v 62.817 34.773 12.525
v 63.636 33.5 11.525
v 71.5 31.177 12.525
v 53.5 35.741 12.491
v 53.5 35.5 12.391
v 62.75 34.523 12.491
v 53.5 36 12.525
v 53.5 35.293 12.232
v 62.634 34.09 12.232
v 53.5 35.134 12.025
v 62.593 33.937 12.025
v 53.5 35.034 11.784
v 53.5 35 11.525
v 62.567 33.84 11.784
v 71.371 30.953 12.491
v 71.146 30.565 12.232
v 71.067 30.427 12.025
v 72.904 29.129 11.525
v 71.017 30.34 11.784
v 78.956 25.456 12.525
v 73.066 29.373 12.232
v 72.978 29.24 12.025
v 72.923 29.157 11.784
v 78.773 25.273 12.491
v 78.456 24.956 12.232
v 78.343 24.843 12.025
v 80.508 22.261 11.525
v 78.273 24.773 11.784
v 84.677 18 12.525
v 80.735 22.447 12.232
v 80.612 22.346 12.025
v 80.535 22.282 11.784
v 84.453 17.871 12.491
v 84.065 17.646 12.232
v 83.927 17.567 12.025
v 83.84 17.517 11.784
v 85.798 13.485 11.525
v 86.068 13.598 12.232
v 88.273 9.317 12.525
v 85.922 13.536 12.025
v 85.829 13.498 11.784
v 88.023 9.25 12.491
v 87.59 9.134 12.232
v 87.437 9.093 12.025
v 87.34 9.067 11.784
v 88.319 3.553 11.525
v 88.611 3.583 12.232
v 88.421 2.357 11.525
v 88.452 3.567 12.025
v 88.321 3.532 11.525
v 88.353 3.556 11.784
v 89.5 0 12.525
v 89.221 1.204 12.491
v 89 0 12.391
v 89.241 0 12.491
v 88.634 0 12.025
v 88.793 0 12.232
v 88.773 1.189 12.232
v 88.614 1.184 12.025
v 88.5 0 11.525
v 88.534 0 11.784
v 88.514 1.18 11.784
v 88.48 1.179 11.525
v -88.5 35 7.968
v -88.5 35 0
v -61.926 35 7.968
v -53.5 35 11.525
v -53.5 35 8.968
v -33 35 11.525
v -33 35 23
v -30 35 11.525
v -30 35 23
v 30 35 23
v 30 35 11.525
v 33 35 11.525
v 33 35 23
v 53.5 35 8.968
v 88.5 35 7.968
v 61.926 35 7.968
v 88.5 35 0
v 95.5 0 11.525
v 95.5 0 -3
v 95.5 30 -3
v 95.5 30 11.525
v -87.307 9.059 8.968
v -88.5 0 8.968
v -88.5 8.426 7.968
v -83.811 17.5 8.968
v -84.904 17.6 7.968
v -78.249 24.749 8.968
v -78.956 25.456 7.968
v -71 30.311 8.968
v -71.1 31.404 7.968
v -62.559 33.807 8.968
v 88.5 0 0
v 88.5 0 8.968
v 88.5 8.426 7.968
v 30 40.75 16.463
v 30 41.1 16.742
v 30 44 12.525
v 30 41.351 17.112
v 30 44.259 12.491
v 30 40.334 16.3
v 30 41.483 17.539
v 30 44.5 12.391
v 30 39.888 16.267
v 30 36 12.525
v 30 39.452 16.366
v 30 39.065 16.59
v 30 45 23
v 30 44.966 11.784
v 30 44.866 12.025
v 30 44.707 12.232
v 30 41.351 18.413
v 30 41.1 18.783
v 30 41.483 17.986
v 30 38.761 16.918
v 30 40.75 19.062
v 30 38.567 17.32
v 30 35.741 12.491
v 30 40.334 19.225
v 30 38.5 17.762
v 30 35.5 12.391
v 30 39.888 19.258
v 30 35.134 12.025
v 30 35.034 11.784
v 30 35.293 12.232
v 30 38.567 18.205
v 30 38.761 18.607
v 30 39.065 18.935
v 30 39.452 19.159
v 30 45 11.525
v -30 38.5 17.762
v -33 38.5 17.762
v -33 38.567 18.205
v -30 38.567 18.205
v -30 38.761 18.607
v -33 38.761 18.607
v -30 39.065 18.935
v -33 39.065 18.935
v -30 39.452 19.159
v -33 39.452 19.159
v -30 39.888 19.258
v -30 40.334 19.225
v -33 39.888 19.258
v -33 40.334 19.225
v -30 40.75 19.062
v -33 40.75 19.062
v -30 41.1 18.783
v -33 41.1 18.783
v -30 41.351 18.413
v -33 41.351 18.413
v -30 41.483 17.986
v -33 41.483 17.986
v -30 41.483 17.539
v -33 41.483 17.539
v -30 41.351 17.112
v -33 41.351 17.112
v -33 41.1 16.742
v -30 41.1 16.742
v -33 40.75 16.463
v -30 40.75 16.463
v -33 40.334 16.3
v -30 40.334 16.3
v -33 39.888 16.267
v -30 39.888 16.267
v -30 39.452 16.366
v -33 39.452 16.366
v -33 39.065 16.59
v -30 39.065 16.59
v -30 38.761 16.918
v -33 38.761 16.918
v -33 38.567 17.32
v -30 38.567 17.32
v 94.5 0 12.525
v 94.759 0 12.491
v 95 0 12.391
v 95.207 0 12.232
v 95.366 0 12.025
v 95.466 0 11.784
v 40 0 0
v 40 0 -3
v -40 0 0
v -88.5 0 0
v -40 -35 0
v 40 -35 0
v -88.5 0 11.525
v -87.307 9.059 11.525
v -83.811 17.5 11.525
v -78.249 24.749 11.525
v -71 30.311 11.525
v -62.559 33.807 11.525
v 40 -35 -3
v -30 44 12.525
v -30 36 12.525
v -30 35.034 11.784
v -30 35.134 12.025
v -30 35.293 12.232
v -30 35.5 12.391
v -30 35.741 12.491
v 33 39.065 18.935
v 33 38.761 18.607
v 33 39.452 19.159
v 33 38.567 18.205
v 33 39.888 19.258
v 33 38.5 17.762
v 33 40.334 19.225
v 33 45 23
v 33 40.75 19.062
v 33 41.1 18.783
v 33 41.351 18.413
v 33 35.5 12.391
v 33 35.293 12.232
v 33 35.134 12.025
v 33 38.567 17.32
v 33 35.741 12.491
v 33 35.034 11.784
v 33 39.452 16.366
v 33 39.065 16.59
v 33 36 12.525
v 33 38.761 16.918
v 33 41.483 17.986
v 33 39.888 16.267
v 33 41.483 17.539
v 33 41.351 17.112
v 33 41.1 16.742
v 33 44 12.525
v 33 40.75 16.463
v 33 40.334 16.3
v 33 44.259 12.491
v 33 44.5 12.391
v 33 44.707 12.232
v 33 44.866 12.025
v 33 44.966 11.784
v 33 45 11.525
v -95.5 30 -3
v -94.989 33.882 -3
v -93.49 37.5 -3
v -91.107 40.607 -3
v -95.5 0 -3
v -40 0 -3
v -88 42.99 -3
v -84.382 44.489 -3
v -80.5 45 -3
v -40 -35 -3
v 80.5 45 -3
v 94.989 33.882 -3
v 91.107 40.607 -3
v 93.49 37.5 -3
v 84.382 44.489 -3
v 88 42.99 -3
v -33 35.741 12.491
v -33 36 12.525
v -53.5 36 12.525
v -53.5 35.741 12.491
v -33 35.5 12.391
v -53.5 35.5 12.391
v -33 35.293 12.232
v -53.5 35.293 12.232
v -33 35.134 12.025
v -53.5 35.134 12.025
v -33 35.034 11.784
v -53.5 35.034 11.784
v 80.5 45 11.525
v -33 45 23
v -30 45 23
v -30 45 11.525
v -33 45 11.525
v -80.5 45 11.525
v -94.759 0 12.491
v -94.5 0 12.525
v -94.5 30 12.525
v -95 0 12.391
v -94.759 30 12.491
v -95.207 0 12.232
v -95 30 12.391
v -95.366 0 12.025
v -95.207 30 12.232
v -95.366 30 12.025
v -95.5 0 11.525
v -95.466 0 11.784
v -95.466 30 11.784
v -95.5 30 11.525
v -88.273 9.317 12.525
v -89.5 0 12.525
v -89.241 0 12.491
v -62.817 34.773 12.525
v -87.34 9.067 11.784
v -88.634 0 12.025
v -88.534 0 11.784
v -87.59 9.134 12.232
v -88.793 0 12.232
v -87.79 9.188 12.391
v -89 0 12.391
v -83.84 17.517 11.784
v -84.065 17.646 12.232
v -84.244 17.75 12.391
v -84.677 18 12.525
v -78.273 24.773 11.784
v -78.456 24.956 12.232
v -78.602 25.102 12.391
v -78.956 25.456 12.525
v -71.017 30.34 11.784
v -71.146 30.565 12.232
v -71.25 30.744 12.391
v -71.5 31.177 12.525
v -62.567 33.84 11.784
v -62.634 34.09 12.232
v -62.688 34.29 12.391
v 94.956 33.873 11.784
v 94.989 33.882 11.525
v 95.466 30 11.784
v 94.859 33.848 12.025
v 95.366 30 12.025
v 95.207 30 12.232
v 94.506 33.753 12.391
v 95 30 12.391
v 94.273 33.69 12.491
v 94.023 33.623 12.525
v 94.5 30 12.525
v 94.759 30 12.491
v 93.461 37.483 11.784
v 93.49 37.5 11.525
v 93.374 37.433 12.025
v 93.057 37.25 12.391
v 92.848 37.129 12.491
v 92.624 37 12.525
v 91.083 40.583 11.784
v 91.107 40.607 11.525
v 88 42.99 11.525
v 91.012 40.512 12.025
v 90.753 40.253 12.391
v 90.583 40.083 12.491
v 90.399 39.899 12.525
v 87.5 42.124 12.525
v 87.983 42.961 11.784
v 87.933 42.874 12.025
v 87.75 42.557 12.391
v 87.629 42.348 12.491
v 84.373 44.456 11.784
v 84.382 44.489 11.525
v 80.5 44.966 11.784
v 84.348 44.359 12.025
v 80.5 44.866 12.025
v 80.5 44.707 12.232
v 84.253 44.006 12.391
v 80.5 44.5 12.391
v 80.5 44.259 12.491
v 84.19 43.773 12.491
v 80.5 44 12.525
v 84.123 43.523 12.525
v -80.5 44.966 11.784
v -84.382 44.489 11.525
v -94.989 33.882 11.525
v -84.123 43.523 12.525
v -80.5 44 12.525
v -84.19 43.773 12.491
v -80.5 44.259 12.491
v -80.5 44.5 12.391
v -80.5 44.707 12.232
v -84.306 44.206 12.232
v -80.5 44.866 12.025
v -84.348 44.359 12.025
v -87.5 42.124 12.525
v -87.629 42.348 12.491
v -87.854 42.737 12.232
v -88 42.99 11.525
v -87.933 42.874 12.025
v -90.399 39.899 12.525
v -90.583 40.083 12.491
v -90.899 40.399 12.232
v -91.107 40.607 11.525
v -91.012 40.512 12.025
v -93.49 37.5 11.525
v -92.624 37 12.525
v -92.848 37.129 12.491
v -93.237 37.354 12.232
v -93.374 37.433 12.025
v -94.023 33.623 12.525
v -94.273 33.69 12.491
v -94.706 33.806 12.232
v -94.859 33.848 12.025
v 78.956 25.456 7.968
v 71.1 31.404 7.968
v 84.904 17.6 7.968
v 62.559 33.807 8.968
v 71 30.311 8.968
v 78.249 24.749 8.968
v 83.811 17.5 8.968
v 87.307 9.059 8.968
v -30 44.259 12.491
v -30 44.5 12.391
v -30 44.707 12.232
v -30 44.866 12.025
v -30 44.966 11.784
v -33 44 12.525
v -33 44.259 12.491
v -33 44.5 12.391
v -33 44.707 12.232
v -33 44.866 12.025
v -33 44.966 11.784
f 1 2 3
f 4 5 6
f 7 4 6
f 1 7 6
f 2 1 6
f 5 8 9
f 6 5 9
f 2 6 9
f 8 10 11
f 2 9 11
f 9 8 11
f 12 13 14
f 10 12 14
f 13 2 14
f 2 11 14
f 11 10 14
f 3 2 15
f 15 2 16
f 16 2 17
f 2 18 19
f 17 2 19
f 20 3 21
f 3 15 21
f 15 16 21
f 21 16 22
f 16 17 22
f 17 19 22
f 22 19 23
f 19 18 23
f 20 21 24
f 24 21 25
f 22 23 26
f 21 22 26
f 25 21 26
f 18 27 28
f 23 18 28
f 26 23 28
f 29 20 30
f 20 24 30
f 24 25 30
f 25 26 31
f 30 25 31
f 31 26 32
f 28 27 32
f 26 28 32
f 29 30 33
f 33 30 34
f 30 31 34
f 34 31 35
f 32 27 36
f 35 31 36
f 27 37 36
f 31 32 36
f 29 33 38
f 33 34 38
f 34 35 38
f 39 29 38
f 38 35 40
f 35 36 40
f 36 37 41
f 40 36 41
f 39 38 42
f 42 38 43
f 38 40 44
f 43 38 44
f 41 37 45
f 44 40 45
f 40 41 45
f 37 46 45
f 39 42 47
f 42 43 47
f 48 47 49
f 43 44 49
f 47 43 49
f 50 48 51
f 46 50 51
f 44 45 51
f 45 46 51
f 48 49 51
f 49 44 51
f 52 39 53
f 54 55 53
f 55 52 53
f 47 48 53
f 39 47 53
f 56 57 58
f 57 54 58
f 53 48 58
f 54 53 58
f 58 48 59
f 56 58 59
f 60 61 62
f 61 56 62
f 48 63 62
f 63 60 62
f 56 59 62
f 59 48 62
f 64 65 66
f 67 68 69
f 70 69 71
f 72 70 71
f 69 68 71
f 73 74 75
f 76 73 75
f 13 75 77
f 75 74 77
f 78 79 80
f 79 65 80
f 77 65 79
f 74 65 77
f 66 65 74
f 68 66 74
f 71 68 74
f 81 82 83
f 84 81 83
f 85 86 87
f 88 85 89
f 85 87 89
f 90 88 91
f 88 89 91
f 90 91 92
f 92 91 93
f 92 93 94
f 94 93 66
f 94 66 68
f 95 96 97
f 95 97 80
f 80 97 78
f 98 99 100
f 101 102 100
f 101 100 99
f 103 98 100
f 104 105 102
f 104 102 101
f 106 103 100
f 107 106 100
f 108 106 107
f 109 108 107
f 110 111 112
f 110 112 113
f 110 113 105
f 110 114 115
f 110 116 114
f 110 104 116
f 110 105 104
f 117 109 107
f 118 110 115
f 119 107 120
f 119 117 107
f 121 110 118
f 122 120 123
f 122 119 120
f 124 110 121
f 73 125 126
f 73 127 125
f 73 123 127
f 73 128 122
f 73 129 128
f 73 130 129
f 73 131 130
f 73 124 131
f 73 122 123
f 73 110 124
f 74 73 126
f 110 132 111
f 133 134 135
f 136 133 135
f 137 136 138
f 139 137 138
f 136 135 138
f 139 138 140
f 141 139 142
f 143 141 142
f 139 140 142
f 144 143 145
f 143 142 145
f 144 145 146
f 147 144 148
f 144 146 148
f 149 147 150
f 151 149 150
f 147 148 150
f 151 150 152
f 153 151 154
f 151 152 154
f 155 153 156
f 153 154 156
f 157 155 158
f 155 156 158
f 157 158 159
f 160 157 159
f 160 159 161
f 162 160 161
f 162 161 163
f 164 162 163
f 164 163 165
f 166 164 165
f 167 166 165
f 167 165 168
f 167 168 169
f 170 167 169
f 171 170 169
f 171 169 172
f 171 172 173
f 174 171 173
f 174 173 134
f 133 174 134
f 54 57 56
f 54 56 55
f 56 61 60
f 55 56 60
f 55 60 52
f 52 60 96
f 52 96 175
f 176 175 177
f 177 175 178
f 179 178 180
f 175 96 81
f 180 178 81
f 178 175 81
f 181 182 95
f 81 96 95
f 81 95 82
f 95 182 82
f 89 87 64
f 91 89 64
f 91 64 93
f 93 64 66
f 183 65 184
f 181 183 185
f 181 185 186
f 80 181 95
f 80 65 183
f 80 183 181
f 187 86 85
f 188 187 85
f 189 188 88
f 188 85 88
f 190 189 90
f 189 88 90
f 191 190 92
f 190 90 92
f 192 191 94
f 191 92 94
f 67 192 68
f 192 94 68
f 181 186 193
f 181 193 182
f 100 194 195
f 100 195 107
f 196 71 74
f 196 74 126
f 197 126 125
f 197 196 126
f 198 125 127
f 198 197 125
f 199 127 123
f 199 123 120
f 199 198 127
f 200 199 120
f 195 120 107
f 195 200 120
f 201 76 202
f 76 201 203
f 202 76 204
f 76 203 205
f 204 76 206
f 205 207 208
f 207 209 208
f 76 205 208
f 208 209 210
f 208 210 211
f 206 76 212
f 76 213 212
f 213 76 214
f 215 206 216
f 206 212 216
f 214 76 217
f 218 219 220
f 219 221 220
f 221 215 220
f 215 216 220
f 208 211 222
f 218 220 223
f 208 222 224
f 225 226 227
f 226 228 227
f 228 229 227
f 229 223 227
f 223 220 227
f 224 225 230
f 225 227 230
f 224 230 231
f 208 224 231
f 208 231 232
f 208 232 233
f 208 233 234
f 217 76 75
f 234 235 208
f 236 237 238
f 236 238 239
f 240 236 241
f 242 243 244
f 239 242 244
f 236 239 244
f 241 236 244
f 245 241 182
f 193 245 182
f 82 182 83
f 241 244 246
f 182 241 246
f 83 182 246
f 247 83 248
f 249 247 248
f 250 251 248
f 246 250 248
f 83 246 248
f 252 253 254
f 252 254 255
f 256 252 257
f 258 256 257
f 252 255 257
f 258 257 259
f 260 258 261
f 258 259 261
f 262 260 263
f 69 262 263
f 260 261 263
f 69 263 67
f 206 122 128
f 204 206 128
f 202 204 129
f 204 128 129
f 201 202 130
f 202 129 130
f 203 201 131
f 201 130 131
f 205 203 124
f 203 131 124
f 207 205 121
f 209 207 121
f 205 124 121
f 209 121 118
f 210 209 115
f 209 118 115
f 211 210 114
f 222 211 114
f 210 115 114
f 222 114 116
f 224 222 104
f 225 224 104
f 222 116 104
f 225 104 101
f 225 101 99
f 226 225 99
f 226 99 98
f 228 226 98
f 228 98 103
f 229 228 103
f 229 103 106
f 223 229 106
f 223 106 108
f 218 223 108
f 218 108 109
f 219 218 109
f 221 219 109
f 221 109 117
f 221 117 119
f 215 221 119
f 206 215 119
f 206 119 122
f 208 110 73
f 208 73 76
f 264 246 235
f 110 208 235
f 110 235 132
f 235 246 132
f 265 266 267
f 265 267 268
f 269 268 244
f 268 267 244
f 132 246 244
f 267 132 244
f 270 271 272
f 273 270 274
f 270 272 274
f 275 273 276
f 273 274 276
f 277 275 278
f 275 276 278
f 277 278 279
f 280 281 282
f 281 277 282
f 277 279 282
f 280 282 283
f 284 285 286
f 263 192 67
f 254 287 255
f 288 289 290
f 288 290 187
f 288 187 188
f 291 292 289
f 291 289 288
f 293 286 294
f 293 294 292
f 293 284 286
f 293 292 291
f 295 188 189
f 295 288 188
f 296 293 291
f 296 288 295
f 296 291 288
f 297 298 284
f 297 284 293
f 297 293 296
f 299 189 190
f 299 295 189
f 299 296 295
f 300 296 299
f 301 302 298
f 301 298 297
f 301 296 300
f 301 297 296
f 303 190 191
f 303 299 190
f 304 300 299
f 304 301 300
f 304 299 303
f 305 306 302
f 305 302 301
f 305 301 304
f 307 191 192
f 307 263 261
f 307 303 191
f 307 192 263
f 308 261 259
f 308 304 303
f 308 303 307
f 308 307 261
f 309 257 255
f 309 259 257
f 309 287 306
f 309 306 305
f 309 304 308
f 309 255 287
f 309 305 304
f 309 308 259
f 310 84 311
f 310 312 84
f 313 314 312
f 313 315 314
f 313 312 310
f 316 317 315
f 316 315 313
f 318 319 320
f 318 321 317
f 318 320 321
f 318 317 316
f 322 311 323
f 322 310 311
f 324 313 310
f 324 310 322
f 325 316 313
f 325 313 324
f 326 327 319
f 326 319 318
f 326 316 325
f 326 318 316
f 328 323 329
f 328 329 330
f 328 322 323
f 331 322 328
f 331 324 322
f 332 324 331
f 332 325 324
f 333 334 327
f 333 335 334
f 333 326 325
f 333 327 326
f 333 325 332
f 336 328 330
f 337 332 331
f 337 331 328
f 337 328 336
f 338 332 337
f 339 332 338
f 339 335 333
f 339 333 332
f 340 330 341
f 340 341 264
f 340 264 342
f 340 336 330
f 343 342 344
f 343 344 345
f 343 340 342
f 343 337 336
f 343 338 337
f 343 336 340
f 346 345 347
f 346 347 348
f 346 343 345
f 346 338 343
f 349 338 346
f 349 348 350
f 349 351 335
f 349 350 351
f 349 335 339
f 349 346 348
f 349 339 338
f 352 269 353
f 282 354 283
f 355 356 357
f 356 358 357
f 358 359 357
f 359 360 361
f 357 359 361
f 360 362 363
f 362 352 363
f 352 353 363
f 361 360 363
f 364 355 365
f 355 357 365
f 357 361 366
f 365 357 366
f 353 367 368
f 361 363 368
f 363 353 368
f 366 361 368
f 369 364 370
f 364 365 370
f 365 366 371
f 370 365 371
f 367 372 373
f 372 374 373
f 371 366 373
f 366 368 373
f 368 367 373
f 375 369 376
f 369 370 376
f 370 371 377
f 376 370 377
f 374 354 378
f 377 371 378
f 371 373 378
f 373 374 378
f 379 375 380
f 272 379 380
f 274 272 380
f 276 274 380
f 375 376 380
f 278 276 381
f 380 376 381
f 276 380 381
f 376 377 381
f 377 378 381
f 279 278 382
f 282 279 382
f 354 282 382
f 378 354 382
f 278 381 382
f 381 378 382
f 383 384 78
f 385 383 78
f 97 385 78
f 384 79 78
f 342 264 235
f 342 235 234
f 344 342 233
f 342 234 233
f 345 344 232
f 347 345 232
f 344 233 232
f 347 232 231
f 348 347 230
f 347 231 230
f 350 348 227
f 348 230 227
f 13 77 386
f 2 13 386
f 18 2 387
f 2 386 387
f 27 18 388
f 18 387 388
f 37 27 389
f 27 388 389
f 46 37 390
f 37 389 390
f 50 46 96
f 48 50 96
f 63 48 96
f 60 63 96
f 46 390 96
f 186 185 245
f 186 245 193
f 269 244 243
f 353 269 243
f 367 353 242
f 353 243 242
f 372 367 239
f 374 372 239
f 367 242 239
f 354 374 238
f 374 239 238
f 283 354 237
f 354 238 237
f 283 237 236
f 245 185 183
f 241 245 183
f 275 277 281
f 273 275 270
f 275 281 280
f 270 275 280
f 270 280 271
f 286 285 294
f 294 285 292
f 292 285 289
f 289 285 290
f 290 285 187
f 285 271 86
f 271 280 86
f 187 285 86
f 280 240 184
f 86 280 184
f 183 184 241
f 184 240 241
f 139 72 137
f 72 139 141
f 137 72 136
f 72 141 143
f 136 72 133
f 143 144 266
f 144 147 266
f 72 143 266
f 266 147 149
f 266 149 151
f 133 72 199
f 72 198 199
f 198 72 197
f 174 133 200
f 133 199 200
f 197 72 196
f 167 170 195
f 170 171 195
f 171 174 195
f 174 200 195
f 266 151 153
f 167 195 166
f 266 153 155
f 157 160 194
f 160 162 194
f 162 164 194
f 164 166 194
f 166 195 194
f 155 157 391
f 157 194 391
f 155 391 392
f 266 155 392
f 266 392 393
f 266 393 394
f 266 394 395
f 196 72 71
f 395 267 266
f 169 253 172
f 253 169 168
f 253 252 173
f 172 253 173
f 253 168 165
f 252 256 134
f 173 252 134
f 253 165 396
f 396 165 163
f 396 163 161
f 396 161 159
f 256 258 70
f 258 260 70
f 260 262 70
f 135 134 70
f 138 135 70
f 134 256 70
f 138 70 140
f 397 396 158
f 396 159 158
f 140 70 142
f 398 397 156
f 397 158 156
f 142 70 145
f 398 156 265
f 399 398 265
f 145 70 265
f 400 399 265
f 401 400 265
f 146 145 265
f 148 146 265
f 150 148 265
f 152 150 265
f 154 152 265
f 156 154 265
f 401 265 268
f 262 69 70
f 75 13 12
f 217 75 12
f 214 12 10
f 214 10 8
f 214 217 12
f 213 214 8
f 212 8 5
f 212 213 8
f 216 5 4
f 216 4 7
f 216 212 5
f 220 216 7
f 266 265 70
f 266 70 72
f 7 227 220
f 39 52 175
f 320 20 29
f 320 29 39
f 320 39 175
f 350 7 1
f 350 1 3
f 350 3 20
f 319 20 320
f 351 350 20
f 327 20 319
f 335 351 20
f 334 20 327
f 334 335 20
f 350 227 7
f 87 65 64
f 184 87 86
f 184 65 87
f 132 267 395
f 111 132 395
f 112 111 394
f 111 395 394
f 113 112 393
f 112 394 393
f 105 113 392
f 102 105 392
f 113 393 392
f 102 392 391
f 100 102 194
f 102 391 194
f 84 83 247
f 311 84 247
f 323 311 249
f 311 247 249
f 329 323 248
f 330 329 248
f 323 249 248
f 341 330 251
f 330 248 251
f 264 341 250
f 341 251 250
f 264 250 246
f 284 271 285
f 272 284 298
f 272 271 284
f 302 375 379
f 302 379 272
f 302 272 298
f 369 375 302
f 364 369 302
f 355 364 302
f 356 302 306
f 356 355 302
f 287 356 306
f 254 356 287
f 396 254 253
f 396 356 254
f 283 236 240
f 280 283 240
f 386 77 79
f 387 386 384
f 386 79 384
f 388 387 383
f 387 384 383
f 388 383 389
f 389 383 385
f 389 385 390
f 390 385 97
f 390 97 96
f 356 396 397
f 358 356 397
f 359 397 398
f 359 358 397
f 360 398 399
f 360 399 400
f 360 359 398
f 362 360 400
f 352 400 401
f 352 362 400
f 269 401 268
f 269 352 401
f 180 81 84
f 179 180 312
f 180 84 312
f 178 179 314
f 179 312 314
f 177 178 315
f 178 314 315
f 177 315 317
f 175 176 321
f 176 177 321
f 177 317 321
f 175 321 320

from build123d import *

# Parameters (mm, degrees)
F0_W         = 80
F0_H         = 35
F0_W_2       = 60
F0_H_2       = 10
F0_W_3       = 3
F1_DEPTH     = 3
F2_DEPTH     = 12.525
F3_DEPTH     = 7.968
F4_DEPTH     = 23
F5_R         = 1.5
F6_DEPTH     = 128.501
F7_T1_DEPTH  = 60
F7_T3_DEPTH  = 47.5
F7_T5_DEPTH  = 20.5
F7_T7_DEPTH  = 32.5
F7_T9_DEPTH  = 20.5
F7_T11_DEPTH = 47.5
F7_T16_ANGLE = 130.941996925
F7_T22_ANGLE = 130.941996925
F7_T26_ANGLE = 94.0941996925
F7_T28_ANGLE = 94.0941996925
F7_T30_ANGLE = 90
F7_T32_ANGLE = 90


# Not quite as in the source:
# - a fillet or chamfer that OpenCascade refuses, or shapes differently, is made with other operations: its cross-section is extruded or revolved along the edge and cut away or added


with BuildPart() as f1:
    # F0 (on Top) → F1 (new body)
    with BuildSketch(Plane.XY):
        with Locations((0, -17.5)):
            Rectangle(F0_W, F0_H)
        with BuildLine():
            Line((-88.5, 35), (-88.5, 0))
            ThreePointArc((-88.5, 0), (-78.2487373415, 24.7487373415), (-53.5, 35))
            Line((-53.5, 35), (-88.5, 35))
        make_face()
        with BuildLine():
            ThreePointArc((53.5, 35), (78.2487373415, 24.7487373415), (88.5, 0))
            Line((88.5, 0), (88.5, 35))
            Line((88.5, 35), (53.5, 35))
        make_face()
        with BuildLine():
            Line((-95.5, 30), (-95.5, 0))
            Line((-95.5, 0), (-88.5, 0))
            Line((-88.5, 0), (-88.5, 35))
            Line((-88.5, 35), (-53.5, 35))
            Line((-53.5, 35), (-33, 35))
            Line((-33, 35), (-33, 45))
            Line((-33, 45), (-80.5, 45))
            ThreePointArc((-80.5, 45), (-91.1066017178, 40.6066017178), (-95.5, 30))
        make_face()
        with Locations((0, 40)):
            Rectangle(F0_W_2, F0_H_2)
        with BuildLine():
            Line((88.5, 35), (88.5, 0))
            Line((88.5, 0), (95.5, 0))
            Line((95.5, 0), (95.5, 30))
            ThreePointArc((95.5, 30), (91.1066017178, 40.6066017178), (80.5, 45))
            Line((80.5, 45), (33, 45))
            Line((33, 45), (33, 35))
            Line((33, 35), (53.5, 35))
            Line((53.5, 35), (88.5, 35))
        make_face()
        with Locations((-31.5, 40)):
            Rectangle(F0_W_3, F0_H_2)
        with Locations((31.5, 40)):
            Rectangle(F0_W_3, F0_H_2)
        with BuildLine():
            ThreePointArc((-53.5, 35), (-78.2487373415, 24.7487373415), (-88.5, 0))
            Line((-88.5, 0), (-40, 0))
            Line((-40, 0), (40, 0))
            Line((40, 0), (88.5, 0))
            ThreePointArc((88.5, 0), (78.2487373415, 24.7487373415), (53.5, 35))
            Line((53.5, 35), (33, 35))
            Line((33, 35), (30, 35))
            Line((30, 35), (-30, 35))
            Line((-30, 35), (-33, 35))
            Line((-33, 35), (-53.5, 35))
        make_face()
    extrude(amount=-F1_DEPTH)

    # F0 (on Top) → F2 (join)
    with BuildSketch(Plane.XY):
        with BuildLine():
            Line((-95.5, 30), (-95.5, 0))
            Line((-95.5, 0), (-88.5, 0))
            Line((-88.5, 0), (-88.5, 35))
            Line((-88.5, 35), (-53.5, 35))
            Line((-53.5, 35), (-33, 35))
            Line((-33, 35), (-33, 45))
            Line((-33, 45), (-80.5, 45))
            ThreePointArc((-80.5, 45), (-91.1066017178, 40.6066017178), (-95.5, 30))
        make_face()
        with Locations((-31.5, 40)):
            Rectangle(F0_W_3, F0_H_2)
        with Locations((0, 40)):
            Rectangle(F0_W_2, F0_H_2)
        with Locations((31.5, 40)):
            Rectangle(F0_W_3, F0_H_2)
        with BuildLine():
            Line((88.5, 35), (88.5, 0))
            Line((88.5, 0), (95.5, 0))
            Line((95.5, 0), (95.5, 30))
            ThreePointArc((95.5, 30), (91.1066017178, 40.6066017178), (80.5, 45))
            Line((80.5, 45), (33, 45))
            Line((33, 45), (33, 35))
            Line((33, 35), (53.5, 35))
            Line((53.5, 35), (88.5, 35))
        make_face()
        with BuildLine():
            Line((-88.5, 35), (-88.5, 0))
            ThreePointArc((-88.5, 0), (-78.2487373415, 24.7487373415), (-53.5, 35))
            Line((-53.5, 35), (-88.5, 35))
        make_face()
        with BuildLine():
            ThreePointArc((53.5, 35), (78.2487373415, 24.7487373415), (88.5, 0))
            Line((88.5, 0), (88.5, 35))
            Line((88.5, 35), (53.5, 35))
        make_face()
    extrude(amount=F2_DEPTH)

    # F0 (on Top) → F3 (cut)
    with BuildSketch(Plane.XY):
        with BuildLine():
            Line((-88.5, 35), (-88.5, 0))
            ThreePointArc((-88.5, 0), (-78.2487373415, 24.7487373415), (-53.5, 35))
            Line((-53.5, 35), (-88.5, 35))
        make_face()
        with BuildLine():
            ThreePointArc((53.5, 35), (78.2487373415, 24.7487373415), (88.5, 0))
            Line((88.5, 0), (88.5, 35))
            Line((88.5, 35), (53.5, 35))
        make_face()
    extrude(amount=F3_DEPTH, mode=Mode.SUBTRACT)

    # F0 (on Top) → F4 (join)
    with BuildSketch(Plane.XY):
        with Locations((-31.5, 40)):
            Rectangle(F0_W_3, F0_H_2)
        with Locations((31.5, 40)):
            Rectangle(F0_W_3, F0_H_2)
    extrude(amount=F4_DEPTH)

    # F5 (on face) → F6 (cut, through all)
    with BuildSketch(Plane(origin=(-33, 0, 0), x_dir=(0, -1, 0), z_dir=(-1, 0, 0))):
        with Locations((-40, 17.7625)):
            Circle(F5_R)
    extrude(amount=-F6_DEPTH, mode=Mode.SUBTRACT)

    # F7: fillet of radius 1 on 14 edges, made by hand

    # F7_s2 → F7_t1 (cut)
    with BuildSketch(Plane.YZ.offset(-30)):
        with BuildLine():
            ThreePointArc((45, 11.525), (44.7071067812, 12.2321067812), (44, 12.525))
            Line((44, 12.525), (45, 12.525))
            Line((45, 12.525), (45, 11.525))
        make_face()
        with BuildLine():
            ThreePointArc((35, 11.525), (35.2928932188, 12.2321067812), (36, 12.525))
            Line((36, 12.525), (35, 12.525))
            Line((35, 12.525), (35, 11.525))
        make_face()
    extrude(amount=F7_T1_DEPTH, mode=Mode.SUBTRACT)

    # F7_s4 → F7_t3 (cut)
    with BuildSketch(Plane.YZ.offset(-80.5)):
        with BuildLine():
            ThreePointArc((44, 12.525), (44.7071067812, 12.2321067812), (45, 11.525))
            Line((45, 11.525), (45, 12.525))
            Line((45, 12.525), (44, 12.525))
        make_face()
    extrude(amount=F7_T3_DEPTH, mode=Mode.SUBTRACT)

    # F7_s6 → F7_t5 (cut)
    with BuildSketch(Plane.YZ.offset(-53.5)):
        with BuildLine():
            ThreePointArc((36, 12.525), (35.2928932188, 12.2321067812), (35, 11.525))
            Line((35, 11.525), (35, 12.525))
            Line((35, 12.525), (36, 12.525))
        make_face()
    extrude(amount=F7_T5_DEPTH, mode=Mode.SUBTRACT)

    # F7_s8 → F7_t7 (cut)
    with BuildSketch(Plane.XZ.offset(-30)):
        with BuildLine():
            ThreePointArc((-94.5, 12.525), (-95.2071067812, 12.2321067812), (-95.5, 11.525))
            Line((-95.5, 11.525), (-95.5, 12.525))
            Line((-95.5, 12.525), (-94.5, 12.525))
        make_face()
        with BuildLine():
            ThreePointArc((95.5, 11.525), (95.2071067812, 12.2321067812), (94.5, 12.525))
            Line((94.5, 12.525), (95.5, 12.525))
            Line((95.5, 12.525), (95.5, 11.525))
        make_face()
    extrude(amount=F7_T7_DEPTH, mode=Mode.SUBTRACT)

    # F7_s10 → F7_t9 (cut)
    with BuildSketch(Plane.YZ.offset(33)):
        with BuildLine():
            ThreePointArc((35, 11.525), (35.2928932188, 12.2321067812), (36, 12.525))
            Line((36, 12.525), (35, 12.525))
            Line((35, 12.525), (35, 11.525))
        make_face()
    extrude(amount=F7_T9_DEPTH, mode=Mode.SUBTRACT)

    # F7_s12 → F7_t11 (cut)
    with BuildSketch(Plane.YZ.offset(33)):
        with BuildLine():
            ThreePointArc((45, 11.525), (44.7071067812, 12.2321067812), (44, 12.525))
            Line((44, 12.525), (45, 12.525))
            Line((45, 12.525), (45, 11.525))
        make_face()
    extrude(amount=F7_T11_DEPTH, mode=Mode.SUBTRACT)


with BuildPart() as f7_tool14:
    # F7_s15 → F7_t16 (revolve)
    with BuildSketch(Plane(origin=(-6.5437628549, 17.5291323355, 0), x_dir=(0, 0, 1), z_dir=(0.3497332189, -0.9368493345, 0))):
        with BuildLine():
            ThreePointArc((8.968, 85.1214393974), (8.2608932188, 85.4143326162), (7.968, 86.1214393974))
            Line((7.968, 86.1214393974), (7.968, 85.1214393974))
            Line((7.968, 85.1214393974), (8.968, 85.1214393974))
        make_face()
    revolve(axis=Axis((-53.5, 0, 7.968), (0, 0, -1)), revolution_arc=F7_T16_ANGLE)

    split(bisect_by=Plane.YZ.offset(-88.5), keep=Keep.TOP)

    split(bisect_by=Plane.XZ.offset(-35), keep=Keep.TOP)


with BuildPart() as f1_1:
    add(f1.part)

    # F7_t13: cut F7_tool14
    add(f7_tool14.part, mode=Mode.SUBTRACT)


with BuildPart() as f7_tool20:
    # F7_s21 → F7_t22 (revolve)
    with BuildSketch(Plane(origin=(46.9562371451, 17.5291323355, 0), x_dir=(0, 0, 1), z_dir=(-0.9368493345, -0.3497332189, 0))):
        with BuildLine():
            ThreePointArc((8.968, 16.2892727897), (8.2608932188, 16.5821660086), (7.968, 17.2892727897))
            Line((7.968, 17.2892727897), (7.968, 16.2892727897))
            Line((7.968, 16.2892727897), (8.968, 16.2892727897))
        make_face()
    revolve(axis=Axis((53.5, 0, 7.968), (0, 0, -1)), revolution_arc=F7_T22_ANGLE)

    split(bisect_by=Plane.YZ.offset(88.5), keep=Keep.BOTTOM)

    split(bisect_by=Plane.XZ.offset(-35), keep=Keep.TOP)


with BuildPart() as f1_2:
    add(f1_1.part)

    # F7_t19: cut F7_tool20
    add(f7_tool20.part, mode=Mode.SUBTRACT)

    # F7_s25 → F7_t26 (revolve, cut)
    with BuildSketch(Plane(origin=(-0.2727138814, 3.809963227, 0), x_dir=(0, 0, 1), z_dir=(0.0713964686, -0.9974480158, 0))):
        with BuildLine():
            ThreePointArc((11.525, 88.3634688467), (12.2321067812, 88.6563620655), (12.525, 89.3634688467))
            Line((12.525, 89.3634688467), (12.525, 88.3634688467))
            Line((12.525, 88.3634688467), (11.525, 88.3634688467))
        make_face()
    revolve(axis=Axis((-53.5, 0, 12.525), (0, 0, -1)), revolution_arc=F7_T26_ANGLE, mode=Mode.SUBTRACT)

    # F7_s27 → F7_t28 (revolve, cut)
    with BuildSketch(Plane.YZ.offset(53.5)):
        with BuildLine():
            ThreePointArc((36, 12.525), (35.2928932188, 12.2321067812), (35, 11.525))
            Line((35, 11.525), (35, 12.525))
            Line((35, 12.525), (36, 12.525))
        make_face()
    revolve(axis=Axis((53.5, 0, 12.525), (0, 0, -1)), revolution_arc=F7_T28_ANGLE, mode=Mode.SUBTRACT)

    # F7_s29 → F7_t30 (revolve, cut)
    with BuildSketch(Plane.XZ.offset(-30)):
        with BuildLine():
            ThreePointArc((95.5, 11.525), (95.2071067812, 12.2321067812), (94.5, 12.525))
            Line((94.5, 12.525), (95.5, 12.525))
            Line((95.5, 12.525), (95.5, 11.525))
        make_face()
    revolve(axis=Axis((80.5, 30, 12.525), (0, 0, 1)), revolution_arc=F7_T30_ANGLE, mode=Mode.SUBTRACT)

    # F7_s31 → F7_t32 (revolve, cut)
    with BuildSketch(Plane.YZ.offset(-80.5)):
        with BuildLine():
            ThreePointArc((44, 12.525), (44.7071067812, 12.2321067812), (45, 11.525))
            Line((45, 11.525), (45, 12.525))
            Line((45, 12.525), (44, 12.525))
        make_face()
    revolve(axis=Axis((-80.5, 30, 12.525), (0, 0, 1)), revolution_arc=F7_T32_ANGLE, mode=Mode.SUBTRACT)


solid = f1_2.part
